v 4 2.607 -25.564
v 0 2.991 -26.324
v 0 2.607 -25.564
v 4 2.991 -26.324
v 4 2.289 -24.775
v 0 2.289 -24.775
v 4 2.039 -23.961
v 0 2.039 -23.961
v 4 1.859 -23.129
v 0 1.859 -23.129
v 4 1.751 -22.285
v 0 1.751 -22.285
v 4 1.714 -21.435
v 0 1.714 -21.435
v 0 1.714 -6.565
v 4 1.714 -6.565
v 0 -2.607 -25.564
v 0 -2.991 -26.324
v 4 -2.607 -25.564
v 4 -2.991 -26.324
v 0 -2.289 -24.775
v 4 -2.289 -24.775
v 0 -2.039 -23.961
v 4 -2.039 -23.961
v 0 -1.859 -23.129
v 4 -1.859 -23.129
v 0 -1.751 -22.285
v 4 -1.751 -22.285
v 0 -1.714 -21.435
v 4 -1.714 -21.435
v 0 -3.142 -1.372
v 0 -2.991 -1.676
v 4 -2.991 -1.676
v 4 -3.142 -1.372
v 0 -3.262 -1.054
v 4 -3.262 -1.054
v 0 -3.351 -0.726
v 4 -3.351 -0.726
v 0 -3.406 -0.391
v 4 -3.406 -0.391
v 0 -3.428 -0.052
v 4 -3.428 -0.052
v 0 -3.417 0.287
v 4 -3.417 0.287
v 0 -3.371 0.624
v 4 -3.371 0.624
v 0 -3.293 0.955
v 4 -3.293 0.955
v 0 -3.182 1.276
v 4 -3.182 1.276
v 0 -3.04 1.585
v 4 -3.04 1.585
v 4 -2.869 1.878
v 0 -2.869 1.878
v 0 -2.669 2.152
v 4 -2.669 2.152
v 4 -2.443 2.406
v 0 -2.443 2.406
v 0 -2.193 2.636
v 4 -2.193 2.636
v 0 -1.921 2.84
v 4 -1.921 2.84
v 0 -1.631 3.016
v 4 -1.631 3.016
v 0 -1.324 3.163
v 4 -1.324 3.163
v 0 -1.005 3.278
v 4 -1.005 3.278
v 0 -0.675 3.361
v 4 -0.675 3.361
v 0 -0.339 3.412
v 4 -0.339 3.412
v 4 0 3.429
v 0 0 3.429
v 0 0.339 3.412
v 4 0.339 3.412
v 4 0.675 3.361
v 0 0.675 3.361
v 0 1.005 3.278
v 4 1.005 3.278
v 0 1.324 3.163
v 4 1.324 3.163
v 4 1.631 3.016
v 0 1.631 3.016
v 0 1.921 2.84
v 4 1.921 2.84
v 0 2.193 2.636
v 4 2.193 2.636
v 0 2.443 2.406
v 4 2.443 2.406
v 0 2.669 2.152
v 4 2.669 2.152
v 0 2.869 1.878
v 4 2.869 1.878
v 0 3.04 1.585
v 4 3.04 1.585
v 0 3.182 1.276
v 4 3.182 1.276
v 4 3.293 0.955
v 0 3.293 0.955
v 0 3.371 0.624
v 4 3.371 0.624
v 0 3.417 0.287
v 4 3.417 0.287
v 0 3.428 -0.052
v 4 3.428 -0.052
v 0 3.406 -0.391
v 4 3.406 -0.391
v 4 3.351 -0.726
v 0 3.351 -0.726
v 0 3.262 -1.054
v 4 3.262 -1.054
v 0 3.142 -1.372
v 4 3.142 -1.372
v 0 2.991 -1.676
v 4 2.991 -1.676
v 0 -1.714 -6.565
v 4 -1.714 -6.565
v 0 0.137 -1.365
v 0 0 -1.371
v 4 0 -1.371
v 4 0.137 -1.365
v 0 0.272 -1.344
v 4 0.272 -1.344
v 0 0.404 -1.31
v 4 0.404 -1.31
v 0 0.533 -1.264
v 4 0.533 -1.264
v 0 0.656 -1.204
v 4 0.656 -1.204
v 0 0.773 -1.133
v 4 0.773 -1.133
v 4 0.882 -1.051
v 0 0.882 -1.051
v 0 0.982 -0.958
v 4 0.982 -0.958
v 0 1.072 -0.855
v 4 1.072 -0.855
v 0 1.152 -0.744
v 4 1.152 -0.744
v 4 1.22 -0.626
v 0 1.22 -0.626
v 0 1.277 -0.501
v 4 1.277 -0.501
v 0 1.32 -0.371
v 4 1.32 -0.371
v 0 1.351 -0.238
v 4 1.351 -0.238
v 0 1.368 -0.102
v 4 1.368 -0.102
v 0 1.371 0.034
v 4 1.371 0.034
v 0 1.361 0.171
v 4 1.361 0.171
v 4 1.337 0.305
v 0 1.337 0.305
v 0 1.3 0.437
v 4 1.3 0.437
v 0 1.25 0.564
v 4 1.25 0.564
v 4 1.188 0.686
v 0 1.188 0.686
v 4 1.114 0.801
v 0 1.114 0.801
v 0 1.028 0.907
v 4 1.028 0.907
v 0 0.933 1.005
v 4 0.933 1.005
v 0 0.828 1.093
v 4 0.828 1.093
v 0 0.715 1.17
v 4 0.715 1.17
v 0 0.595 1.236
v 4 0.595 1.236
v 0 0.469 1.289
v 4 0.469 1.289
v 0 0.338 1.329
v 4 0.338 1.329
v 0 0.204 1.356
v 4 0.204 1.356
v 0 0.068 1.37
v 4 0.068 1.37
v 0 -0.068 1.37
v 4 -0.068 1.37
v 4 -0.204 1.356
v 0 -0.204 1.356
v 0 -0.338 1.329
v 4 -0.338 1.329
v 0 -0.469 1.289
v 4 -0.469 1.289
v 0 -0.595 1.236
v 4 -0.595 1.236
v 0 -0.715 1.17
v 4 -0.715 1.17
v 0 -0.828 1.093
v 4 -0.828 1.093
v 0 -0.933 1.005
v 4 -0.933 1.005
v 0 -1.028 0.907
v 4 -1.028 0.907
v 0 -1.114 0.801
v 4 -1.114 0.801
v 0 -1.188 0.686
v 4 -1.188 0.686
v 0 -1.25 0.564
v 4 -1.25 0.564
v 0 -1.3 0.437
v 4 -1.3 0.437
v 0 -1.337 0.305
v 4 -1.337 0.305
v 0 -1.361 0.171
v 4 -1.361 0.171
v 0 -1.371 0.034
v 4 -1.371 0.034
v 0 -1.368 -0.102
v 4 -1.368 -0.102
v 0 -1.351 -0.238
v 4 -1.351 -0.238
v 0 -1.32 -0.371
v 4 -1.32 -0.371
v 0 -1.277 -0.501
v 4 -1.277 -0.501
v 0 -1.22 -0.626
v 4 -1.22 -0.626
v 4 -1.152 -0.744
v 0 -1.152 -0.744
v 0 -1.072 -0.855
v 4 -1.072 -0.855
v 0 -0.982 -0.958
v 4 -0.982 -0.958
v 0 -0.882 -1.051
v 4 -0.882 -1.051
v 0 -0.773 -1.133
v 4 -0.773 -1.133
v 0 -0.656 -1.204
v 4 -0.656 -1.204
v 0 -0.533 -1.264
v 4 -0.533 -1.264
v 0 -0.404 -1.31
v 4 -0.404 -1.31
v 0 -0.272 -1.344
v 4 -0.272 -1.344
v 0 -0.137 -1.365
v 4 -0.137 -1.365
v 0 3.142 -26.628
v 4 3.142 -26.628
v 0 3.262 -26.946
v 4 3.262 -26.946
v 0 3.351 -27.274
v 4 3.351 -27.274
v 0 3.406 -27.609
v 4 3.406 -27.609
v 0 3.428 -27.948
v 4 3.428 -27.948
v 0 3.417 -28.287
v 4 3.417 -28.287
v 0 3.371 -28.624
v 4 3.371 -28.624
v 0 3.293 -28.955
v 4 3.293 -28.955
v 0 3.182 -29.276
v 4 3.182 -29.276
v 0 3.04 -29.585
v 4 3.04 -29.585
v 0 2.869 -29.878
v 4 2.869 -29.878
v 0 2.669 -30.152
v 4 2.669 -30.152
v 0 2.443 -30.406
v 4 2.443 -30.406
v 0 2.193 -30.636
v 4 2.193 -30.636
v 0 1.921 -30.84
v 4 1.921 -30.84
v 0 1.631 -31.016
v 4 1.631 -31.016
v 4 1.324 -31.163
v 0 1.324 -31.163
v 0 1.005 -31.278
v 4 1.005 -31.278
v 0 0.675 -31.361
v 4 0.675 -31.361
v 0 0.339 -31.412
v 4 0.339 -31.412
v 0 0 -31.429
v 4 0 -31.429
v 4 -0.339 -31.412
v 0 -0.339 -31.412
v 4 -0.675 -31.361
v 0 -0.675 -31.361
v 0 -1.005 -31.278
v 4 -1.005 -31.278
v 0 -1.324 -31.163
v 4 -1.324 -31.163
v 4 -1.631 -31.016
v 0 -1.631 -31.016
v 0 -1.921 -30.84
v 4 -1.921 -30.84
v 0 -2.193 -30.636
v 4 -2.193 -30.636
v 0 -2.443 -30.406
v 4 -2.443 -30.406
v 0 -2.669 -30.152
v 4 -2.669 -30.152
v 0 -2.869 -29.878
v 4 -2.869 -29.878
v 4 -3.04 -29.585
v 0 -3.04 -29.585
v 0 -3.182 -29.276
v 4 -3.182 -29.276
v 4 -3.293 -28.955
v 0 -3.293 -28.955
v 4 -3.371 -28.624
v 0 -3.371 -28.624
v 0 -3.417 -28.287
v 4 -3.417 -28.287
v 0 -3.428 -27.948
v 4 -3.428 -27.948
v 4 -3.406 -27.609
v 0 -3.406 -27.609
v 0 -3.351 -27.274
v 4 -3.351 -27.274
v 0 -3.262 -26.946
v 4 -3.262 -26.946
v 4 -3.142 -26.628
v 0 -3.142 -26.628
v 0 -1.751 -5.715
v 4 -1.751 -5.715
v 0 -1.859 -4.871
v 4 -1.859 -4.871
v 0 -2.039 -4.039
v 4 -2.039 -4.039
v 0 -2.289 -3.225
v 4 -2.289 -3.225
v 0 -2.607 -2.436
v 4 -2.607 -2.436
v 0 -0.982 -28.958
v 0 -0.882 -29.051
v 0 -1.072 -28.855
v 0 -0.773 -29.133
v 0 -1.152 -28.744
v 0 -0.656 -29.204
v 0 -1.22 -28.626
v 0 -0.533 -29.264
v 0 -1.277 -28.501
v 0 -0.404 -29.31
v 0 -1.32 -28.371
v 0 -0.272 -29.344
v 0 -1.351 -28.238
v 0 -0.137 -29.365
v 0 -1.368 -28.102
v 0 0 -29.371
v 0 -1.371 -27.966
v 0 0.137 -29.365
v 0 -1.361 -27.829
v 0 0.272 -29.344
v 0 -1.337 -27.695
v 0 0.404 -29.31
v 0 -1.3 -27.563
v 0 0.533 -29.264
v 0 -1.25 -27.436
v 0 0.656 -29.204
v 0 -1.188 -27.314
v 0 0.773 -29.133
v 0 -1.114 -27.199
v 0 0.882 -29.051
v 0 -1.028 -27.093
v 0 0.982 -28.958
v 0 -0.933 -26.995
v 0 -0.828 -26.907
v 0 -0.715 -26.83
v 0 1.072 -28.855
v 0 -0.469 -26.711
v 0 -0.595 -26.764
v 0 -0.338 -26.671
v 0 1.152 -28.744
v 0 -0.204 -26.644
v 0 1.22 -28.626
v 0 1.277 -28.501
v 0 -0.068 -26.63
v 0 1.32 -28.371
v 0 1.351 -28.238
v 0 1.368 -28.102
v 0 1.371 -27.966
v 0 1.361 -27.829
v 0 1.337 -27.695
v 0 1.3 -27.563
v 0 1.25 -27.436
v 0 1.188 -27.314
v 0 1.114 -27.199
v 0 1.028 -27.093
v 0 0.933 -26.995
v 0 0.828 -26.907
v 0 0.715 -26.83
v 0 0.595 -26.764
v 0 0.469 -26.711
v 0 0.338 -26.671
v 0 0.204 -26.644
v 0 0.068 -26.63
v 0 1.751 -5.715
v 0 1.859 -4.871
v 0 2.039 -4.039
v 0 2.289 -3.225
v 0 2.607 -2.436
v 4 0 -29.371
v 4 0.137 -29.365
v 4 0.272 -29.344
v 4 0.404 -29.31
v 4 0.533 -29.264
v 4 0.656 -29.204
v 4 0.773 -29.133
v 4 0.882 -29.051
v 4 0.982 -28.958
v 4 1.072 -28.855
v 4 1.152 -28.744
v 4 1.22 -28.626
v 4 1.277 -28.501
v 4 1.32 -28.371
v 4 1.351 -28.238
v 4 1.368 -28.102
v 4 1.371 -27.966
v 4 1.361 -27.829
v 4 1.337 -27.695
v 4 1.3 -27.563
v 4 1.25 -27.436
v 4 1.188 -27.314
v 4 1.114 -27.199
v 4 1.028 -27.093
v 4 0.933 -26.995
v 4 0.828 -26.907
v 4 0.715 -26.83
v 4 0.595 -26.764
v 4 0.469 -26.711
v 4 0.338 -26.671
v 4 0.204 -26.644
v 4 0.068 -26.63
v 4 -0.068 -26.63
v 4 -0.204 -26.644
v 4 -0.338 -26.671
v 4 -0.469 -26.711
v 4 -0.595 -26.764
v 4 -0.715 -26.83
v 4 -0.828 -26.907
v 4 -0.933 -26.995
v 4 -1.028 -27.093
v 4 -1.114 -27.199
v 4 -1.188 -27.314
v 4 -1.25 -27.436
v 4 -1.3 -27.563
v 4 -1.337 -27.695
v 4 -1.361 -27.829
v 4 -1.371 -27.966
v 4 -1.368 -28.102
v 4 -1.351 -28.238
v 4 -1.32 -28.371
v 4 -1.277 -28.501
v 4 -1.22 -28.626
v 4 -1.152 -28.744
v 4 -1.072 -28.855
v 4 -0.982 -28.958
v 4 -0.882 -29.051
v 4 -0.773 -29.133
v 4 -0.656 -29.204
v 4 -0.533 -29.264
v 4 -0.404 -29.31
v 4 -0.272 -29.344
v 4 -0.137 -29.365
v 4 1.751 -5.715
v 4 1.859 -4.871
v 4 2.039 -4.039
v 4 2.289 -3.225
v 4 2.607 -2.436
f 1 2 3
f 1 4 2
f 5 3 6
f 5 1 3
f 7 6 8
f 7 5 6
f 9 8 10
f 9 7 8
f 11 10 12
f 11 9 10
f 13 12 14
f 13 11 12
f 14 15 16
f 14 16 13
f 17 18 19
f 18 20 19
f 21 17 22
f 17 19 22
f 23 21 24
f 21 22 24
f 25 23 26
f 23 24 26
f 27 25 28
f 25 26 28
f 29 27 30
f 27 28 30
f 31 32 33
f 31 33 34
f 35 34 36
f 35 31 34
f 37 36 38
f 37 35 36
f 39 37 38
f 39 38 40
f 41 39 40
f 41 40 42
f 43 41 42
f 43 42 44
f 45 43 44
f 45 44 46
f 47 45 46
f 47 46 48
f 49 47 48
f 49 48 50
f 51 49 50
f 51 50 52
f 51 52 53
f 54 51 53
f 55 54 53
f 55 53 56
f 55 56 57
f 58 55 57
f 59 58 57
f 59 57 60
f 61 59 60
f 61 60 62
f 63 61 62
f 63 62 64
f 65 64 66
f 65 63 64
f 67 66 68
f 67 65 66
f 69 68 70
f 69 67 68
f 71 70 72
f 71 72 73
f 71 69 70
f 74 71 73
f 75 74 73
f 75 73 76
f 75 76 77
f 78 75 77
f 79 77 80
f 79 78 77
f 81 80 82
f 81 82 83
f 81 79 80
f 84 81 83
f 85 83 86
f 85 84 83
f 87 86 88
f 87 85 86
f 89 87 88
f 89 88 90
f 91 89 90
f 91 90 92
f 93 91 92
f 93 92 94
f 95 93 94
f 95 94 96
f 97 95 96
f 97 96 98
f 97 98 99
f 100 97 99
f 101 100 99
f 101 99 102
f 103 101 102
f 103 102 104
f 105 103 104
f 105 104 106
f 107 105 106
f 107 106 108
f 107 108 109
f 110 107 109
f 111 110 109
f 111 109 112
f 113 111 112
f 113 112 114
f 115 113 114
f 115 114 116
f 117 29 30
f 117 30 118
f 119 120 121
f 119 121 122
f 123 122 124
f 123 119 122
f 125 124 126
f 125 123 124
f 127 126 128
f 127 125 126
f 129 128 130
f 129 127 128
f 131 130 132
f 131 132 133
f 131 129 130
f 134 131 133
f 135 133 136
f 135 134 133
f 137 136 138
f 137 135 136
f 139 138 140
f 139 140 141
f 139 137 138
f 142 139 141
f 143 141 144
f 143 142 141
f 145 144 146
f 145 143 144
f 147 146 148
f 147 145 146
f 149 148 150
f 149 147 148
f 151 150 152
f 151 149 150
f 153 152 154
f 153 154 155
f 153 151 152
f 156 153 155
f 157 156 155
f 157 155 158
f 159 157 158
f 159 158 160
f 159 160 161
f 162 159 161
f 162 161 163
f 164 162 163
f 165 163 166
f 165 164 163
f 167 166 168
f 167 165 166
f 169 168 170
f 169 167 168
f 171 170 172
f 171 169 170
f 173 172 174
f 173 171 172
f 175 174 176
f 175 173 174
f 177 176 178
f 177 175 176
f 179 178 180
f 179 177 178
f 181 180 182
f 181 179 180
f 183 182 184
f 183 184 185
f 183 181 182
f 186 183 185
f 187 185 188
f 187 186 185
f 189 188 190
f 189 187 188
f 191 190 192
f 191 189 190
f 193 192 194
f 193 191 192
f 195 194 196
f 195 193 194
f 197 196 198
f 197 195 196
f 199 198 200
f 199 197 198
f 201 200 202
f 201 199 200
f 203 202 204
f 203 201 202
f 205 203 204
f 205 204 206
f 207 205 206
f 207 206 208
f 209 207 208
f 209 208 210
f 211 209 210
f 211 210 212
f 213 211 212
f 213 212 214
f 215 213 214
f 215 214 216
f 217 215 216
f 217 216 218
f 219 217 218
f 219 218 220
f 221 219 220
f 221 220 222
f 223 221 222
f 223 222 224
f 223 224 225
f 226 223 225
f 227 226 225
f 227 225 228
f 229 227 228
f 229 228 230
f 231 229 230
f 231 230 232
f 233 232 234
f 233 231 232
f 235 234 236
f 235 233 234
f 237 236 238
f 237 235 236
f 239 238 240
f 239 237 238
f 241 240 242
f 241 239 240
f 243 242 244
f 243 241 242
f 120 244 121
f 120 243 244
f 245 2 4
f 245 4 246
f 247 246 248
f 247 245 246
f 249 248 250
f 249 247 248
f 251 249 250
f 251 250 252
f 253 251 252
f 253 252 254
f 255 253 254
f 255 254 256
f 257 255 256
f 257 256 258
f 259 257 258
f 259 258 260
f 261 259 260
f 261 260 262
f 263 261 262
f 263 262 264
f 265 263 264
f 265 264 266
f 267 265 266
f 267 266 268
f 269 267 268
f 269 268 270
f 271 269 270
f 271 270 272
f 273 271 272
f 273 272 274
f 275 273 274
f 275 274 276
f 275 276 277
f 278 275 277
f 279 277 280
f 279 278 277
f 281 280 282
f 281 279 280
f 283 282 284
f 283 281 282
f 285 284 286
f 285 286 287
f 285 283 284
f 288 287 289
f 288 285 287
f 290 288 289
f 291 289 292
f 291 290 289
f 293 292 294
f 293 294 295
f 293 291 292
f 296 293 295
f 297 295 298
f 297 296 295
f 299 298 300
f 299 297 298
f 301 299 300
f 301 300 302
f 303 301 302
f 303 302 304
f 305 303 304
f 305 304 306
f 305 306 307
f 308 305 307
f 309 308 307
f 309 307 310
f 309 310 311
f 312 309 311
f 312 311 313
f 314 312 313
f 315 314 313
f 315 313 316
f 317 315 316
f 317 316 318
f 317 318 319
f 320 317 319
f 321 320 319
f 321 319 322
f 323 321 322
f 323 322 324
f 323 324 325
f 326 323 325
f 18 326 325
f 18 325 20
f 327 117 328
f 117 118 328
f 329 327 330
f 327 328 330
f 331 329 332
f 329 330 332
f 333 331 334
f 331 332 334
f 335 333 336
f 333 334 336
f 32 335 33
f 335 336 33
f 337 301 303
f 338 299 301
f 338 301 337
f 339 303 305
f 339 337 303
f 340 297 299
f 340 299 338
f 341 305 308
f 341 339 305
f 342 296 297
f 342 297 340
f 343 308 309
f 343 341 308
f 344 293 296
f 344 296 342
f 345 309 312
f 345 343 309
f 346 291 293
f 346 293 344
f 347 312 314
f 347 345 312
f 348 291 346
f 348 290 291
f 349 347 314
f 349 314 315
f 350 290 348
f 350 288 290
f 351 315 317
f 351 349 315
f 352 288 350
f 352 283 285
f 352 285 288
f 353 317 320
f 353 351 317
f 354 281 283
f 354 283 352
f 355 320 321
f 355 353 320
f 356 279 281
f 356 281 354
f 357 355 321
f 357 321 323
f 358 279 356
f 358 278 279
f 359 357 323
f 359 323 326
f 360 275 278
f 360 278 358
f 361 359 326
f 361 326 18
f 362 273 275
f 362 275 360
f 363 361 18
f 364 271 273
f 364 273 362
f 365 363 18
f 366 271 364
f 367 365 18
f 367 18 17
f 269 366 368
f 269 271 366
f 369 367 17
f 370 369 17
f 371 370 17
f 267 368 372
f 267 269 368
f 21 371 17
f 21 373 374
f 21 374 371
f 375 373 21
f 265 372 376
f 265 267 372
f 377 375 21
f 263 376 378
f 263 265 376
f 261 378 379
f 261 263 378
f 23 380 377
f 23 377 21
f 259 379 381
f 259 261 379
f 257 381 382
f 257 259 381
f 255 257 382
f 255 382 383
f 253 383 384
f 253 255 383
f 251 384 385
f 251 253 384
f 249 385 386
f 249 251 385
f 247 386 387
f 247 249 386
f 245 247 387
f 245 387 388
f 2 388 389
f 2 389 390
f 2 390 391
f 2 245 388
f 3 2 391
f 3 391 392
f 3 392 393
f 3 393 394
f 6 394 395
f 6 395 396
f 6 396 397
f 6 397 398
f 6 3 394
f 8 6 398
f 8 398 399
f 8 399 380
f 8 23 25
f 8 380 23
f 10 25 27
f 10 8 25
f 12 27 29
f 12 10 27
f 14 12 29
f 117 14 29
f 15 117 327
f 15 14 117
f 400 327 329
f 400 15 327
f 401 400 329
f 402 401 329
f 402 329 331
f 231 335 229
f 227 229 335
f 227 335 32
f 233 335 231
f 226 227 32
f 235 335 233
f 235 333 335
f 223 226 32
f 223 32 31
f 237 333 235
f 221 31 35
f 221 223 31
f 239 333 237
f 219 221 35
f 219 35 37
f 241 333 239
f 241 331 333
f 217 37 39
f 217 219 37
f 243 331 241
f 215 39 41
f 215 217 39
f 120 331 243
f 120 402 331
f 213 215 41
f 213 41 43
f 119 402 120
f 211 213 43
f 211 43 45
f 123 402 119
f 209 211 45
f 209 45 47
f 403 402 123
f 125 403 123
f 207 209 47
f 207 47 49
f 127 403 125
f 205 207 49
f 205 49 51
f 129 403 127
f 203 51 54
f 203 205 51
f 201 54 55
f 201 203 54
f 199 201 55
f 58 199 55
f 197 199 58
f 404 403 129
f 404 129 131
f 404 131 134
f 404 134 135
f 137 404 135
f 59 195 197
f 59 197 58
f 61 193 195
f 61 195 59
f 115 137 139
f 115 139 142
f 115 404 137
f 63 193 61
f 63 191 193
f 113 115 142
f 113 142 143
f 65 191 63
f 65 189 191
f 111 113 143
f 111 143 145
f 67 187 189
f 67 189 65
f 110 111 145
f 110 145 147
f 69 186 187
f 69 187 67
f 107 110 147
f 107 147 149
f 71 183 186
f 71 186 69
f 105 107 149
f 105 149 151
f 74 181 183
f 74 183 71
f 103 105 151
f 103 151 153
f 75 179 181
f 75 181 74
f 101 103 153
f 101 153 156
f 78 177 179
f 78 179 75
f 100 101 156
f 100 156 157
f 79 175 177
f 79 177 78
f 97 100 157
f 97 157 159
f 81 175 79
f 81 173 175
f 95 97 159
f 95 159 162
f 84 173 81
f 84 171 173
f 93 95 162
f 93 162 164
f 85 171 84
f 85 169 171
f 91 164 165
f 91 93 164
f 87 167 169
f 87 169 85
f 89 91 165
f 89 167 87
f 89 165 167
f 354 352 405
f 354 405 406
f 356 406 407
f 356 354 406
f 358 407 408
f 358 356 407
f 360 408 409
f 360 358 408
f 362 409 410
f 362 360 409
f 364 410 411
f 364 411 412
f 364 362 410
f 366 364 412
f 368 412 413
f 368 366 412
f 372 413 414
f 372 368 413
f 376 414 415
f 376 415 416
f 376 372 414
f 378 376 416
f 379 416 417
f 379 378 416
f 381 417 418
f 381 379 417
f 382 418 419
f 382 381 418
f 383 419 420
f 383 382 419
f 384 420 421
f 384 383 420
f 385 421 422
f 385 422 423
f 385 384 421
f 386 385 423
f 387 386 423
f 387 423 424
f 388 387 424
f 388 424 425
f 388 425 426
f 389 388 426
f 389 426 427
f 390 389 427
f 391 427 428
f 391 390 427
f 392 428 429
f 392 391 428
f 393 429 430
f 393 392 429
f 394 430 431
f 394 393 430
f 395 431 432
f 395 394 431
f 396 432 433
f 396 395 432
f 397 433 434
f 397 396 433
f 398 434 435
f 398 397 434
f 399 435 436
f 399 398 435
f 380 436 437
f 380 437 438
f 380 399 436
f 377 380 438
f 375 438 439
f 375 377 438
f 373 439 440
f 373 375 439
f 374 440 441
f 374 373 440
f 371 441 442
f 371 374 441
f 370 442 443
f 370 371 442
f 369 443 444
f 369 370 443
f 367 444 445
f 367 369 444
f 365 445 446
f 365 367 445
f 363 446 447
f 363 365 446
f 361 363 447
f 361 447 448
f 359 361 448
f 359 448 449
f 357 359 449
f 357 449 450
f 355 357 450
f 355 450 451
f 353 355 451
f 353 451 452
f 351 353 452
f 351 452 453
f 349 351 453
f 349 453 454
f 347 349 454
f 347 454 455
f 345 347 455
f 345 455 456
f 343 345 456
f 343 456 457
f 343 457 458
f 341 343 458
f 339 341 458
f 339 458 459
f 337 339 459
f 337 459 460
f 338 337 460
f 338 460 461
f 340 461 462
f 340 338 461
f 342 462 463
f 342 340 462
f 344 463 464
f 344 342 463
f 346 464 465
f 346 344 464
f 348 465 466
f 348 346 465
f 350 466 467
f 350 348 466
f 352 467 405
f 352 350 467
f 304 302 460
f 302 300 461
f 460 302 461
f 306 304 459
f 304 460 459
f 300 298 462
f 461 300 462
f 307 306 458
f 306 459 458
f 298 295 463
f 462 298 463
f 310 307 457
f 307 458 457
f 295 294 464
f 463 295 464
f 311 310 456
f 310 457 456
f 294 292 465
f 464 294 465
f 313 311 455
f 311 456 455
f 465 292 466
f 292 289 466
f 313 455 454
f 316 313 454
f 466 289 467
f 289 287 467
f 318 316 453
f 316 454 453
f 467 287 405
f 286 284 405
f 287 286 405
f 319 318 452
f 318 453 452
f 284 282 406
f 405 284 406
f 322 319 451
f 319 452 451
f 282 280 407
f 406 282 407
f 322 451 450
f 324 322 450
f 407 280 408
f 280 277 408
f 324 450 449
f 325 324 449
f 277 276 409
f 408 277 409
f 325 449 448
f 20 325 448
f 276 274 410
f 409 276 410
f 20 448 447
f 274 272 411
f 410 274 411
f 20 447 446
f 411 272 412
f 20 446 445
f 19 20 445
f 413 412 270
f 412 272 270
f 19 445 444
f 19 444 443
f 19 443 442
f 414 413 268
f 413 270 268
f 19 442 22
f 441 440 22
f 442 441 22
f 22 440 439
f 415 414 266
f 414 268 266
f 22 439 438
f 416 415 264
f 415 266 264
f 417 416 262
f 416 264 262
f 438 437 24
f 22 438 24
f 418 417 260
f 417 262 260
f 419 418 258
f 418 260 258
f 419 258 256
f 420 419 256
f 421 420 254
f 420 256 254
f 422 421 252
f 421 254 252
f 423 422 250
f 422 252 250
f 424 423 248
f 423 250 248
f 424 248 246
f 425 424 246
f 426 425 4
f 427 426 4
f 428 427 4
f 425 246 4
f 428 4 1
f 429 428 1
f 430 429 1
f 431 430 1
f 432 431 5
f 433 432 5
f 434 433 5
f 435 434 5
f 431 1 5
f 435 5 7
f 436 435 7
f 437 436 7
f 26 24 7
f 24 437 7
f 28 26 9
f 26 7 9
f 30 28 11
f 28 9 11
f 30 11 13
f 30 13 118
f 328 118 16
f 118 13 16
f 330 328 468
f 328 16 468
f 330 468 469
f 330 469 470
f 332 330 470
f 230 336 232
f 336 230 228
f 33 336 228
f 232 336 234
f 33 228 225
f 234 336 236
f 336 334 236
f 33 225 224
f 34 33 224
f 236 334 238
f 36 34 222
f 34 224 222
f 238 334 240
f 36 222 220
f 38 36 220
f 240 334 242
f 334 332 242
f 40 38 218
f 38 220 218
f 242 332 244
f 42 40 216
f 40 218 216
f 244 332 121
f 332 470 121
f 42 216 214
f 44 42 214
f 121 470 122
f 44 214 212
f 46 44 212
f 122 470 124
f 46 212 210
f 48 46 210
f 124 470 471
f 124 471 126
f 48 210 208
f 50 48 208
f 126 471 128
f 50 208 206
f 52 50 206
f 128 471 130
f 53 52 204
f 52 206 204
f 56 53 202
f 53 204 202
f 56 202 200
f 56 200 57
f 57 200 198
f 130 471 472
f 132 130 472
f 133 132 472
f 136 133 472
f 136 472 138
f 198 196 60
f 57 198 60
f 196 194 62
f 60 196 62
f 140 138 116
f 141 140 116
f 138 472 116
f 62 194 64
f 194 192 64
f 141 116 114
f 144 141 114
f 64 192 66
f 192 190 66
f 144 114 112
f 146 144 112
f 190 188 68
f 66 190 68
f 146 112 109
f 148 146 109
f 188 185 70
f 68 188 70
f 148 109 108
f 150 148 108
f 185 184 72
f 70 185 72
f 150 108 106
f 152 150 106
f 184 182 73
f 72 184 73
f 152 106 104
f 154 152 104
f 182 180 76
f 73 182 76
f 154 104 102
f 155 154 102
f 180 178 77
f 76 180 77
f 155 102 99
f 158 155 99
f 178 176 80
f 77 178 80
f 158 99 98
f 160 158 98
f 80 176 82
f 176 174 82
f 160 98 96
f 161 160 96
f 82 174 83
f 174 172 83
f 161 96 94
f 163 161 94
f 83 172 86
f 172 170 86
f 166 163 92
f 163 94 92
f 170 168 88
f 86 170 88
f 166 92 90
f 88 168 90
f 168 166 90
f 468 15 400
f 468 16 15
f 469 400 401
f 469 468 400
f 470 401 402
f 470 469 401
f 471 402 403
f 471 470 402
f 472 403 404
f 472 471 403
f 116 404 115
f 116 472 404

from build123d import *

# Parameters (mm, degrees)
SKETCH1_R           = 1.371428571
BOSS_EXTRUDE1_DEPTH = 4
FILLET1_R           = 10


with BuildPart() as part:
    # Sketch1 → Boss-Extrude1 (new body)
    with BuildSketch(Plane(origin=(0, 0, 0), x_dir=(0, 0, -1), z_dir=(1, 0, 0))):
        with BuildLine():
            Line((18, 1.714285714), (25.030770044, 1.714285714))
            ThreePointArc((25.030770044, 1.714285714), (31.428571429, 0), (25.030770044, -1.714285714))
            Line((25.030770044, -1.714285714), (18, -1.714285714))
            Line((18, -1.714285714), (2.969229956, -1.714285714))
            ThreePointArc((2.969229956, -1.714285714), (-3.428571429, 0), (2.969229956, 1.714285714))
            Line((2.969229956, 1.714285714), (18, 1.714285714))
        make_face()
        Circle(SKETCH1_R, mode=Mode.SUBTRACT)
        with Locations((28, 0)):
            Circle(SKETCH1_R, mode=Mode.SUBTRACT)
    extrude(amount=BOSS_EXTRUDE1_DEPTH)

    # Fillet1
    fillet1_edges = [part.edges().sort_by_distance(p)[0] for p in [
        (2, 1.714285714, -25.030770044),
        (2, -1.714285714, -25.030770044),
        (2, -1.714285714, -2.969229956),
        (2, 1.714285714, -2.969229956),
    ]]
    fillet(fillet1_edges, radius=FILLET1_R)


solid = part.part
